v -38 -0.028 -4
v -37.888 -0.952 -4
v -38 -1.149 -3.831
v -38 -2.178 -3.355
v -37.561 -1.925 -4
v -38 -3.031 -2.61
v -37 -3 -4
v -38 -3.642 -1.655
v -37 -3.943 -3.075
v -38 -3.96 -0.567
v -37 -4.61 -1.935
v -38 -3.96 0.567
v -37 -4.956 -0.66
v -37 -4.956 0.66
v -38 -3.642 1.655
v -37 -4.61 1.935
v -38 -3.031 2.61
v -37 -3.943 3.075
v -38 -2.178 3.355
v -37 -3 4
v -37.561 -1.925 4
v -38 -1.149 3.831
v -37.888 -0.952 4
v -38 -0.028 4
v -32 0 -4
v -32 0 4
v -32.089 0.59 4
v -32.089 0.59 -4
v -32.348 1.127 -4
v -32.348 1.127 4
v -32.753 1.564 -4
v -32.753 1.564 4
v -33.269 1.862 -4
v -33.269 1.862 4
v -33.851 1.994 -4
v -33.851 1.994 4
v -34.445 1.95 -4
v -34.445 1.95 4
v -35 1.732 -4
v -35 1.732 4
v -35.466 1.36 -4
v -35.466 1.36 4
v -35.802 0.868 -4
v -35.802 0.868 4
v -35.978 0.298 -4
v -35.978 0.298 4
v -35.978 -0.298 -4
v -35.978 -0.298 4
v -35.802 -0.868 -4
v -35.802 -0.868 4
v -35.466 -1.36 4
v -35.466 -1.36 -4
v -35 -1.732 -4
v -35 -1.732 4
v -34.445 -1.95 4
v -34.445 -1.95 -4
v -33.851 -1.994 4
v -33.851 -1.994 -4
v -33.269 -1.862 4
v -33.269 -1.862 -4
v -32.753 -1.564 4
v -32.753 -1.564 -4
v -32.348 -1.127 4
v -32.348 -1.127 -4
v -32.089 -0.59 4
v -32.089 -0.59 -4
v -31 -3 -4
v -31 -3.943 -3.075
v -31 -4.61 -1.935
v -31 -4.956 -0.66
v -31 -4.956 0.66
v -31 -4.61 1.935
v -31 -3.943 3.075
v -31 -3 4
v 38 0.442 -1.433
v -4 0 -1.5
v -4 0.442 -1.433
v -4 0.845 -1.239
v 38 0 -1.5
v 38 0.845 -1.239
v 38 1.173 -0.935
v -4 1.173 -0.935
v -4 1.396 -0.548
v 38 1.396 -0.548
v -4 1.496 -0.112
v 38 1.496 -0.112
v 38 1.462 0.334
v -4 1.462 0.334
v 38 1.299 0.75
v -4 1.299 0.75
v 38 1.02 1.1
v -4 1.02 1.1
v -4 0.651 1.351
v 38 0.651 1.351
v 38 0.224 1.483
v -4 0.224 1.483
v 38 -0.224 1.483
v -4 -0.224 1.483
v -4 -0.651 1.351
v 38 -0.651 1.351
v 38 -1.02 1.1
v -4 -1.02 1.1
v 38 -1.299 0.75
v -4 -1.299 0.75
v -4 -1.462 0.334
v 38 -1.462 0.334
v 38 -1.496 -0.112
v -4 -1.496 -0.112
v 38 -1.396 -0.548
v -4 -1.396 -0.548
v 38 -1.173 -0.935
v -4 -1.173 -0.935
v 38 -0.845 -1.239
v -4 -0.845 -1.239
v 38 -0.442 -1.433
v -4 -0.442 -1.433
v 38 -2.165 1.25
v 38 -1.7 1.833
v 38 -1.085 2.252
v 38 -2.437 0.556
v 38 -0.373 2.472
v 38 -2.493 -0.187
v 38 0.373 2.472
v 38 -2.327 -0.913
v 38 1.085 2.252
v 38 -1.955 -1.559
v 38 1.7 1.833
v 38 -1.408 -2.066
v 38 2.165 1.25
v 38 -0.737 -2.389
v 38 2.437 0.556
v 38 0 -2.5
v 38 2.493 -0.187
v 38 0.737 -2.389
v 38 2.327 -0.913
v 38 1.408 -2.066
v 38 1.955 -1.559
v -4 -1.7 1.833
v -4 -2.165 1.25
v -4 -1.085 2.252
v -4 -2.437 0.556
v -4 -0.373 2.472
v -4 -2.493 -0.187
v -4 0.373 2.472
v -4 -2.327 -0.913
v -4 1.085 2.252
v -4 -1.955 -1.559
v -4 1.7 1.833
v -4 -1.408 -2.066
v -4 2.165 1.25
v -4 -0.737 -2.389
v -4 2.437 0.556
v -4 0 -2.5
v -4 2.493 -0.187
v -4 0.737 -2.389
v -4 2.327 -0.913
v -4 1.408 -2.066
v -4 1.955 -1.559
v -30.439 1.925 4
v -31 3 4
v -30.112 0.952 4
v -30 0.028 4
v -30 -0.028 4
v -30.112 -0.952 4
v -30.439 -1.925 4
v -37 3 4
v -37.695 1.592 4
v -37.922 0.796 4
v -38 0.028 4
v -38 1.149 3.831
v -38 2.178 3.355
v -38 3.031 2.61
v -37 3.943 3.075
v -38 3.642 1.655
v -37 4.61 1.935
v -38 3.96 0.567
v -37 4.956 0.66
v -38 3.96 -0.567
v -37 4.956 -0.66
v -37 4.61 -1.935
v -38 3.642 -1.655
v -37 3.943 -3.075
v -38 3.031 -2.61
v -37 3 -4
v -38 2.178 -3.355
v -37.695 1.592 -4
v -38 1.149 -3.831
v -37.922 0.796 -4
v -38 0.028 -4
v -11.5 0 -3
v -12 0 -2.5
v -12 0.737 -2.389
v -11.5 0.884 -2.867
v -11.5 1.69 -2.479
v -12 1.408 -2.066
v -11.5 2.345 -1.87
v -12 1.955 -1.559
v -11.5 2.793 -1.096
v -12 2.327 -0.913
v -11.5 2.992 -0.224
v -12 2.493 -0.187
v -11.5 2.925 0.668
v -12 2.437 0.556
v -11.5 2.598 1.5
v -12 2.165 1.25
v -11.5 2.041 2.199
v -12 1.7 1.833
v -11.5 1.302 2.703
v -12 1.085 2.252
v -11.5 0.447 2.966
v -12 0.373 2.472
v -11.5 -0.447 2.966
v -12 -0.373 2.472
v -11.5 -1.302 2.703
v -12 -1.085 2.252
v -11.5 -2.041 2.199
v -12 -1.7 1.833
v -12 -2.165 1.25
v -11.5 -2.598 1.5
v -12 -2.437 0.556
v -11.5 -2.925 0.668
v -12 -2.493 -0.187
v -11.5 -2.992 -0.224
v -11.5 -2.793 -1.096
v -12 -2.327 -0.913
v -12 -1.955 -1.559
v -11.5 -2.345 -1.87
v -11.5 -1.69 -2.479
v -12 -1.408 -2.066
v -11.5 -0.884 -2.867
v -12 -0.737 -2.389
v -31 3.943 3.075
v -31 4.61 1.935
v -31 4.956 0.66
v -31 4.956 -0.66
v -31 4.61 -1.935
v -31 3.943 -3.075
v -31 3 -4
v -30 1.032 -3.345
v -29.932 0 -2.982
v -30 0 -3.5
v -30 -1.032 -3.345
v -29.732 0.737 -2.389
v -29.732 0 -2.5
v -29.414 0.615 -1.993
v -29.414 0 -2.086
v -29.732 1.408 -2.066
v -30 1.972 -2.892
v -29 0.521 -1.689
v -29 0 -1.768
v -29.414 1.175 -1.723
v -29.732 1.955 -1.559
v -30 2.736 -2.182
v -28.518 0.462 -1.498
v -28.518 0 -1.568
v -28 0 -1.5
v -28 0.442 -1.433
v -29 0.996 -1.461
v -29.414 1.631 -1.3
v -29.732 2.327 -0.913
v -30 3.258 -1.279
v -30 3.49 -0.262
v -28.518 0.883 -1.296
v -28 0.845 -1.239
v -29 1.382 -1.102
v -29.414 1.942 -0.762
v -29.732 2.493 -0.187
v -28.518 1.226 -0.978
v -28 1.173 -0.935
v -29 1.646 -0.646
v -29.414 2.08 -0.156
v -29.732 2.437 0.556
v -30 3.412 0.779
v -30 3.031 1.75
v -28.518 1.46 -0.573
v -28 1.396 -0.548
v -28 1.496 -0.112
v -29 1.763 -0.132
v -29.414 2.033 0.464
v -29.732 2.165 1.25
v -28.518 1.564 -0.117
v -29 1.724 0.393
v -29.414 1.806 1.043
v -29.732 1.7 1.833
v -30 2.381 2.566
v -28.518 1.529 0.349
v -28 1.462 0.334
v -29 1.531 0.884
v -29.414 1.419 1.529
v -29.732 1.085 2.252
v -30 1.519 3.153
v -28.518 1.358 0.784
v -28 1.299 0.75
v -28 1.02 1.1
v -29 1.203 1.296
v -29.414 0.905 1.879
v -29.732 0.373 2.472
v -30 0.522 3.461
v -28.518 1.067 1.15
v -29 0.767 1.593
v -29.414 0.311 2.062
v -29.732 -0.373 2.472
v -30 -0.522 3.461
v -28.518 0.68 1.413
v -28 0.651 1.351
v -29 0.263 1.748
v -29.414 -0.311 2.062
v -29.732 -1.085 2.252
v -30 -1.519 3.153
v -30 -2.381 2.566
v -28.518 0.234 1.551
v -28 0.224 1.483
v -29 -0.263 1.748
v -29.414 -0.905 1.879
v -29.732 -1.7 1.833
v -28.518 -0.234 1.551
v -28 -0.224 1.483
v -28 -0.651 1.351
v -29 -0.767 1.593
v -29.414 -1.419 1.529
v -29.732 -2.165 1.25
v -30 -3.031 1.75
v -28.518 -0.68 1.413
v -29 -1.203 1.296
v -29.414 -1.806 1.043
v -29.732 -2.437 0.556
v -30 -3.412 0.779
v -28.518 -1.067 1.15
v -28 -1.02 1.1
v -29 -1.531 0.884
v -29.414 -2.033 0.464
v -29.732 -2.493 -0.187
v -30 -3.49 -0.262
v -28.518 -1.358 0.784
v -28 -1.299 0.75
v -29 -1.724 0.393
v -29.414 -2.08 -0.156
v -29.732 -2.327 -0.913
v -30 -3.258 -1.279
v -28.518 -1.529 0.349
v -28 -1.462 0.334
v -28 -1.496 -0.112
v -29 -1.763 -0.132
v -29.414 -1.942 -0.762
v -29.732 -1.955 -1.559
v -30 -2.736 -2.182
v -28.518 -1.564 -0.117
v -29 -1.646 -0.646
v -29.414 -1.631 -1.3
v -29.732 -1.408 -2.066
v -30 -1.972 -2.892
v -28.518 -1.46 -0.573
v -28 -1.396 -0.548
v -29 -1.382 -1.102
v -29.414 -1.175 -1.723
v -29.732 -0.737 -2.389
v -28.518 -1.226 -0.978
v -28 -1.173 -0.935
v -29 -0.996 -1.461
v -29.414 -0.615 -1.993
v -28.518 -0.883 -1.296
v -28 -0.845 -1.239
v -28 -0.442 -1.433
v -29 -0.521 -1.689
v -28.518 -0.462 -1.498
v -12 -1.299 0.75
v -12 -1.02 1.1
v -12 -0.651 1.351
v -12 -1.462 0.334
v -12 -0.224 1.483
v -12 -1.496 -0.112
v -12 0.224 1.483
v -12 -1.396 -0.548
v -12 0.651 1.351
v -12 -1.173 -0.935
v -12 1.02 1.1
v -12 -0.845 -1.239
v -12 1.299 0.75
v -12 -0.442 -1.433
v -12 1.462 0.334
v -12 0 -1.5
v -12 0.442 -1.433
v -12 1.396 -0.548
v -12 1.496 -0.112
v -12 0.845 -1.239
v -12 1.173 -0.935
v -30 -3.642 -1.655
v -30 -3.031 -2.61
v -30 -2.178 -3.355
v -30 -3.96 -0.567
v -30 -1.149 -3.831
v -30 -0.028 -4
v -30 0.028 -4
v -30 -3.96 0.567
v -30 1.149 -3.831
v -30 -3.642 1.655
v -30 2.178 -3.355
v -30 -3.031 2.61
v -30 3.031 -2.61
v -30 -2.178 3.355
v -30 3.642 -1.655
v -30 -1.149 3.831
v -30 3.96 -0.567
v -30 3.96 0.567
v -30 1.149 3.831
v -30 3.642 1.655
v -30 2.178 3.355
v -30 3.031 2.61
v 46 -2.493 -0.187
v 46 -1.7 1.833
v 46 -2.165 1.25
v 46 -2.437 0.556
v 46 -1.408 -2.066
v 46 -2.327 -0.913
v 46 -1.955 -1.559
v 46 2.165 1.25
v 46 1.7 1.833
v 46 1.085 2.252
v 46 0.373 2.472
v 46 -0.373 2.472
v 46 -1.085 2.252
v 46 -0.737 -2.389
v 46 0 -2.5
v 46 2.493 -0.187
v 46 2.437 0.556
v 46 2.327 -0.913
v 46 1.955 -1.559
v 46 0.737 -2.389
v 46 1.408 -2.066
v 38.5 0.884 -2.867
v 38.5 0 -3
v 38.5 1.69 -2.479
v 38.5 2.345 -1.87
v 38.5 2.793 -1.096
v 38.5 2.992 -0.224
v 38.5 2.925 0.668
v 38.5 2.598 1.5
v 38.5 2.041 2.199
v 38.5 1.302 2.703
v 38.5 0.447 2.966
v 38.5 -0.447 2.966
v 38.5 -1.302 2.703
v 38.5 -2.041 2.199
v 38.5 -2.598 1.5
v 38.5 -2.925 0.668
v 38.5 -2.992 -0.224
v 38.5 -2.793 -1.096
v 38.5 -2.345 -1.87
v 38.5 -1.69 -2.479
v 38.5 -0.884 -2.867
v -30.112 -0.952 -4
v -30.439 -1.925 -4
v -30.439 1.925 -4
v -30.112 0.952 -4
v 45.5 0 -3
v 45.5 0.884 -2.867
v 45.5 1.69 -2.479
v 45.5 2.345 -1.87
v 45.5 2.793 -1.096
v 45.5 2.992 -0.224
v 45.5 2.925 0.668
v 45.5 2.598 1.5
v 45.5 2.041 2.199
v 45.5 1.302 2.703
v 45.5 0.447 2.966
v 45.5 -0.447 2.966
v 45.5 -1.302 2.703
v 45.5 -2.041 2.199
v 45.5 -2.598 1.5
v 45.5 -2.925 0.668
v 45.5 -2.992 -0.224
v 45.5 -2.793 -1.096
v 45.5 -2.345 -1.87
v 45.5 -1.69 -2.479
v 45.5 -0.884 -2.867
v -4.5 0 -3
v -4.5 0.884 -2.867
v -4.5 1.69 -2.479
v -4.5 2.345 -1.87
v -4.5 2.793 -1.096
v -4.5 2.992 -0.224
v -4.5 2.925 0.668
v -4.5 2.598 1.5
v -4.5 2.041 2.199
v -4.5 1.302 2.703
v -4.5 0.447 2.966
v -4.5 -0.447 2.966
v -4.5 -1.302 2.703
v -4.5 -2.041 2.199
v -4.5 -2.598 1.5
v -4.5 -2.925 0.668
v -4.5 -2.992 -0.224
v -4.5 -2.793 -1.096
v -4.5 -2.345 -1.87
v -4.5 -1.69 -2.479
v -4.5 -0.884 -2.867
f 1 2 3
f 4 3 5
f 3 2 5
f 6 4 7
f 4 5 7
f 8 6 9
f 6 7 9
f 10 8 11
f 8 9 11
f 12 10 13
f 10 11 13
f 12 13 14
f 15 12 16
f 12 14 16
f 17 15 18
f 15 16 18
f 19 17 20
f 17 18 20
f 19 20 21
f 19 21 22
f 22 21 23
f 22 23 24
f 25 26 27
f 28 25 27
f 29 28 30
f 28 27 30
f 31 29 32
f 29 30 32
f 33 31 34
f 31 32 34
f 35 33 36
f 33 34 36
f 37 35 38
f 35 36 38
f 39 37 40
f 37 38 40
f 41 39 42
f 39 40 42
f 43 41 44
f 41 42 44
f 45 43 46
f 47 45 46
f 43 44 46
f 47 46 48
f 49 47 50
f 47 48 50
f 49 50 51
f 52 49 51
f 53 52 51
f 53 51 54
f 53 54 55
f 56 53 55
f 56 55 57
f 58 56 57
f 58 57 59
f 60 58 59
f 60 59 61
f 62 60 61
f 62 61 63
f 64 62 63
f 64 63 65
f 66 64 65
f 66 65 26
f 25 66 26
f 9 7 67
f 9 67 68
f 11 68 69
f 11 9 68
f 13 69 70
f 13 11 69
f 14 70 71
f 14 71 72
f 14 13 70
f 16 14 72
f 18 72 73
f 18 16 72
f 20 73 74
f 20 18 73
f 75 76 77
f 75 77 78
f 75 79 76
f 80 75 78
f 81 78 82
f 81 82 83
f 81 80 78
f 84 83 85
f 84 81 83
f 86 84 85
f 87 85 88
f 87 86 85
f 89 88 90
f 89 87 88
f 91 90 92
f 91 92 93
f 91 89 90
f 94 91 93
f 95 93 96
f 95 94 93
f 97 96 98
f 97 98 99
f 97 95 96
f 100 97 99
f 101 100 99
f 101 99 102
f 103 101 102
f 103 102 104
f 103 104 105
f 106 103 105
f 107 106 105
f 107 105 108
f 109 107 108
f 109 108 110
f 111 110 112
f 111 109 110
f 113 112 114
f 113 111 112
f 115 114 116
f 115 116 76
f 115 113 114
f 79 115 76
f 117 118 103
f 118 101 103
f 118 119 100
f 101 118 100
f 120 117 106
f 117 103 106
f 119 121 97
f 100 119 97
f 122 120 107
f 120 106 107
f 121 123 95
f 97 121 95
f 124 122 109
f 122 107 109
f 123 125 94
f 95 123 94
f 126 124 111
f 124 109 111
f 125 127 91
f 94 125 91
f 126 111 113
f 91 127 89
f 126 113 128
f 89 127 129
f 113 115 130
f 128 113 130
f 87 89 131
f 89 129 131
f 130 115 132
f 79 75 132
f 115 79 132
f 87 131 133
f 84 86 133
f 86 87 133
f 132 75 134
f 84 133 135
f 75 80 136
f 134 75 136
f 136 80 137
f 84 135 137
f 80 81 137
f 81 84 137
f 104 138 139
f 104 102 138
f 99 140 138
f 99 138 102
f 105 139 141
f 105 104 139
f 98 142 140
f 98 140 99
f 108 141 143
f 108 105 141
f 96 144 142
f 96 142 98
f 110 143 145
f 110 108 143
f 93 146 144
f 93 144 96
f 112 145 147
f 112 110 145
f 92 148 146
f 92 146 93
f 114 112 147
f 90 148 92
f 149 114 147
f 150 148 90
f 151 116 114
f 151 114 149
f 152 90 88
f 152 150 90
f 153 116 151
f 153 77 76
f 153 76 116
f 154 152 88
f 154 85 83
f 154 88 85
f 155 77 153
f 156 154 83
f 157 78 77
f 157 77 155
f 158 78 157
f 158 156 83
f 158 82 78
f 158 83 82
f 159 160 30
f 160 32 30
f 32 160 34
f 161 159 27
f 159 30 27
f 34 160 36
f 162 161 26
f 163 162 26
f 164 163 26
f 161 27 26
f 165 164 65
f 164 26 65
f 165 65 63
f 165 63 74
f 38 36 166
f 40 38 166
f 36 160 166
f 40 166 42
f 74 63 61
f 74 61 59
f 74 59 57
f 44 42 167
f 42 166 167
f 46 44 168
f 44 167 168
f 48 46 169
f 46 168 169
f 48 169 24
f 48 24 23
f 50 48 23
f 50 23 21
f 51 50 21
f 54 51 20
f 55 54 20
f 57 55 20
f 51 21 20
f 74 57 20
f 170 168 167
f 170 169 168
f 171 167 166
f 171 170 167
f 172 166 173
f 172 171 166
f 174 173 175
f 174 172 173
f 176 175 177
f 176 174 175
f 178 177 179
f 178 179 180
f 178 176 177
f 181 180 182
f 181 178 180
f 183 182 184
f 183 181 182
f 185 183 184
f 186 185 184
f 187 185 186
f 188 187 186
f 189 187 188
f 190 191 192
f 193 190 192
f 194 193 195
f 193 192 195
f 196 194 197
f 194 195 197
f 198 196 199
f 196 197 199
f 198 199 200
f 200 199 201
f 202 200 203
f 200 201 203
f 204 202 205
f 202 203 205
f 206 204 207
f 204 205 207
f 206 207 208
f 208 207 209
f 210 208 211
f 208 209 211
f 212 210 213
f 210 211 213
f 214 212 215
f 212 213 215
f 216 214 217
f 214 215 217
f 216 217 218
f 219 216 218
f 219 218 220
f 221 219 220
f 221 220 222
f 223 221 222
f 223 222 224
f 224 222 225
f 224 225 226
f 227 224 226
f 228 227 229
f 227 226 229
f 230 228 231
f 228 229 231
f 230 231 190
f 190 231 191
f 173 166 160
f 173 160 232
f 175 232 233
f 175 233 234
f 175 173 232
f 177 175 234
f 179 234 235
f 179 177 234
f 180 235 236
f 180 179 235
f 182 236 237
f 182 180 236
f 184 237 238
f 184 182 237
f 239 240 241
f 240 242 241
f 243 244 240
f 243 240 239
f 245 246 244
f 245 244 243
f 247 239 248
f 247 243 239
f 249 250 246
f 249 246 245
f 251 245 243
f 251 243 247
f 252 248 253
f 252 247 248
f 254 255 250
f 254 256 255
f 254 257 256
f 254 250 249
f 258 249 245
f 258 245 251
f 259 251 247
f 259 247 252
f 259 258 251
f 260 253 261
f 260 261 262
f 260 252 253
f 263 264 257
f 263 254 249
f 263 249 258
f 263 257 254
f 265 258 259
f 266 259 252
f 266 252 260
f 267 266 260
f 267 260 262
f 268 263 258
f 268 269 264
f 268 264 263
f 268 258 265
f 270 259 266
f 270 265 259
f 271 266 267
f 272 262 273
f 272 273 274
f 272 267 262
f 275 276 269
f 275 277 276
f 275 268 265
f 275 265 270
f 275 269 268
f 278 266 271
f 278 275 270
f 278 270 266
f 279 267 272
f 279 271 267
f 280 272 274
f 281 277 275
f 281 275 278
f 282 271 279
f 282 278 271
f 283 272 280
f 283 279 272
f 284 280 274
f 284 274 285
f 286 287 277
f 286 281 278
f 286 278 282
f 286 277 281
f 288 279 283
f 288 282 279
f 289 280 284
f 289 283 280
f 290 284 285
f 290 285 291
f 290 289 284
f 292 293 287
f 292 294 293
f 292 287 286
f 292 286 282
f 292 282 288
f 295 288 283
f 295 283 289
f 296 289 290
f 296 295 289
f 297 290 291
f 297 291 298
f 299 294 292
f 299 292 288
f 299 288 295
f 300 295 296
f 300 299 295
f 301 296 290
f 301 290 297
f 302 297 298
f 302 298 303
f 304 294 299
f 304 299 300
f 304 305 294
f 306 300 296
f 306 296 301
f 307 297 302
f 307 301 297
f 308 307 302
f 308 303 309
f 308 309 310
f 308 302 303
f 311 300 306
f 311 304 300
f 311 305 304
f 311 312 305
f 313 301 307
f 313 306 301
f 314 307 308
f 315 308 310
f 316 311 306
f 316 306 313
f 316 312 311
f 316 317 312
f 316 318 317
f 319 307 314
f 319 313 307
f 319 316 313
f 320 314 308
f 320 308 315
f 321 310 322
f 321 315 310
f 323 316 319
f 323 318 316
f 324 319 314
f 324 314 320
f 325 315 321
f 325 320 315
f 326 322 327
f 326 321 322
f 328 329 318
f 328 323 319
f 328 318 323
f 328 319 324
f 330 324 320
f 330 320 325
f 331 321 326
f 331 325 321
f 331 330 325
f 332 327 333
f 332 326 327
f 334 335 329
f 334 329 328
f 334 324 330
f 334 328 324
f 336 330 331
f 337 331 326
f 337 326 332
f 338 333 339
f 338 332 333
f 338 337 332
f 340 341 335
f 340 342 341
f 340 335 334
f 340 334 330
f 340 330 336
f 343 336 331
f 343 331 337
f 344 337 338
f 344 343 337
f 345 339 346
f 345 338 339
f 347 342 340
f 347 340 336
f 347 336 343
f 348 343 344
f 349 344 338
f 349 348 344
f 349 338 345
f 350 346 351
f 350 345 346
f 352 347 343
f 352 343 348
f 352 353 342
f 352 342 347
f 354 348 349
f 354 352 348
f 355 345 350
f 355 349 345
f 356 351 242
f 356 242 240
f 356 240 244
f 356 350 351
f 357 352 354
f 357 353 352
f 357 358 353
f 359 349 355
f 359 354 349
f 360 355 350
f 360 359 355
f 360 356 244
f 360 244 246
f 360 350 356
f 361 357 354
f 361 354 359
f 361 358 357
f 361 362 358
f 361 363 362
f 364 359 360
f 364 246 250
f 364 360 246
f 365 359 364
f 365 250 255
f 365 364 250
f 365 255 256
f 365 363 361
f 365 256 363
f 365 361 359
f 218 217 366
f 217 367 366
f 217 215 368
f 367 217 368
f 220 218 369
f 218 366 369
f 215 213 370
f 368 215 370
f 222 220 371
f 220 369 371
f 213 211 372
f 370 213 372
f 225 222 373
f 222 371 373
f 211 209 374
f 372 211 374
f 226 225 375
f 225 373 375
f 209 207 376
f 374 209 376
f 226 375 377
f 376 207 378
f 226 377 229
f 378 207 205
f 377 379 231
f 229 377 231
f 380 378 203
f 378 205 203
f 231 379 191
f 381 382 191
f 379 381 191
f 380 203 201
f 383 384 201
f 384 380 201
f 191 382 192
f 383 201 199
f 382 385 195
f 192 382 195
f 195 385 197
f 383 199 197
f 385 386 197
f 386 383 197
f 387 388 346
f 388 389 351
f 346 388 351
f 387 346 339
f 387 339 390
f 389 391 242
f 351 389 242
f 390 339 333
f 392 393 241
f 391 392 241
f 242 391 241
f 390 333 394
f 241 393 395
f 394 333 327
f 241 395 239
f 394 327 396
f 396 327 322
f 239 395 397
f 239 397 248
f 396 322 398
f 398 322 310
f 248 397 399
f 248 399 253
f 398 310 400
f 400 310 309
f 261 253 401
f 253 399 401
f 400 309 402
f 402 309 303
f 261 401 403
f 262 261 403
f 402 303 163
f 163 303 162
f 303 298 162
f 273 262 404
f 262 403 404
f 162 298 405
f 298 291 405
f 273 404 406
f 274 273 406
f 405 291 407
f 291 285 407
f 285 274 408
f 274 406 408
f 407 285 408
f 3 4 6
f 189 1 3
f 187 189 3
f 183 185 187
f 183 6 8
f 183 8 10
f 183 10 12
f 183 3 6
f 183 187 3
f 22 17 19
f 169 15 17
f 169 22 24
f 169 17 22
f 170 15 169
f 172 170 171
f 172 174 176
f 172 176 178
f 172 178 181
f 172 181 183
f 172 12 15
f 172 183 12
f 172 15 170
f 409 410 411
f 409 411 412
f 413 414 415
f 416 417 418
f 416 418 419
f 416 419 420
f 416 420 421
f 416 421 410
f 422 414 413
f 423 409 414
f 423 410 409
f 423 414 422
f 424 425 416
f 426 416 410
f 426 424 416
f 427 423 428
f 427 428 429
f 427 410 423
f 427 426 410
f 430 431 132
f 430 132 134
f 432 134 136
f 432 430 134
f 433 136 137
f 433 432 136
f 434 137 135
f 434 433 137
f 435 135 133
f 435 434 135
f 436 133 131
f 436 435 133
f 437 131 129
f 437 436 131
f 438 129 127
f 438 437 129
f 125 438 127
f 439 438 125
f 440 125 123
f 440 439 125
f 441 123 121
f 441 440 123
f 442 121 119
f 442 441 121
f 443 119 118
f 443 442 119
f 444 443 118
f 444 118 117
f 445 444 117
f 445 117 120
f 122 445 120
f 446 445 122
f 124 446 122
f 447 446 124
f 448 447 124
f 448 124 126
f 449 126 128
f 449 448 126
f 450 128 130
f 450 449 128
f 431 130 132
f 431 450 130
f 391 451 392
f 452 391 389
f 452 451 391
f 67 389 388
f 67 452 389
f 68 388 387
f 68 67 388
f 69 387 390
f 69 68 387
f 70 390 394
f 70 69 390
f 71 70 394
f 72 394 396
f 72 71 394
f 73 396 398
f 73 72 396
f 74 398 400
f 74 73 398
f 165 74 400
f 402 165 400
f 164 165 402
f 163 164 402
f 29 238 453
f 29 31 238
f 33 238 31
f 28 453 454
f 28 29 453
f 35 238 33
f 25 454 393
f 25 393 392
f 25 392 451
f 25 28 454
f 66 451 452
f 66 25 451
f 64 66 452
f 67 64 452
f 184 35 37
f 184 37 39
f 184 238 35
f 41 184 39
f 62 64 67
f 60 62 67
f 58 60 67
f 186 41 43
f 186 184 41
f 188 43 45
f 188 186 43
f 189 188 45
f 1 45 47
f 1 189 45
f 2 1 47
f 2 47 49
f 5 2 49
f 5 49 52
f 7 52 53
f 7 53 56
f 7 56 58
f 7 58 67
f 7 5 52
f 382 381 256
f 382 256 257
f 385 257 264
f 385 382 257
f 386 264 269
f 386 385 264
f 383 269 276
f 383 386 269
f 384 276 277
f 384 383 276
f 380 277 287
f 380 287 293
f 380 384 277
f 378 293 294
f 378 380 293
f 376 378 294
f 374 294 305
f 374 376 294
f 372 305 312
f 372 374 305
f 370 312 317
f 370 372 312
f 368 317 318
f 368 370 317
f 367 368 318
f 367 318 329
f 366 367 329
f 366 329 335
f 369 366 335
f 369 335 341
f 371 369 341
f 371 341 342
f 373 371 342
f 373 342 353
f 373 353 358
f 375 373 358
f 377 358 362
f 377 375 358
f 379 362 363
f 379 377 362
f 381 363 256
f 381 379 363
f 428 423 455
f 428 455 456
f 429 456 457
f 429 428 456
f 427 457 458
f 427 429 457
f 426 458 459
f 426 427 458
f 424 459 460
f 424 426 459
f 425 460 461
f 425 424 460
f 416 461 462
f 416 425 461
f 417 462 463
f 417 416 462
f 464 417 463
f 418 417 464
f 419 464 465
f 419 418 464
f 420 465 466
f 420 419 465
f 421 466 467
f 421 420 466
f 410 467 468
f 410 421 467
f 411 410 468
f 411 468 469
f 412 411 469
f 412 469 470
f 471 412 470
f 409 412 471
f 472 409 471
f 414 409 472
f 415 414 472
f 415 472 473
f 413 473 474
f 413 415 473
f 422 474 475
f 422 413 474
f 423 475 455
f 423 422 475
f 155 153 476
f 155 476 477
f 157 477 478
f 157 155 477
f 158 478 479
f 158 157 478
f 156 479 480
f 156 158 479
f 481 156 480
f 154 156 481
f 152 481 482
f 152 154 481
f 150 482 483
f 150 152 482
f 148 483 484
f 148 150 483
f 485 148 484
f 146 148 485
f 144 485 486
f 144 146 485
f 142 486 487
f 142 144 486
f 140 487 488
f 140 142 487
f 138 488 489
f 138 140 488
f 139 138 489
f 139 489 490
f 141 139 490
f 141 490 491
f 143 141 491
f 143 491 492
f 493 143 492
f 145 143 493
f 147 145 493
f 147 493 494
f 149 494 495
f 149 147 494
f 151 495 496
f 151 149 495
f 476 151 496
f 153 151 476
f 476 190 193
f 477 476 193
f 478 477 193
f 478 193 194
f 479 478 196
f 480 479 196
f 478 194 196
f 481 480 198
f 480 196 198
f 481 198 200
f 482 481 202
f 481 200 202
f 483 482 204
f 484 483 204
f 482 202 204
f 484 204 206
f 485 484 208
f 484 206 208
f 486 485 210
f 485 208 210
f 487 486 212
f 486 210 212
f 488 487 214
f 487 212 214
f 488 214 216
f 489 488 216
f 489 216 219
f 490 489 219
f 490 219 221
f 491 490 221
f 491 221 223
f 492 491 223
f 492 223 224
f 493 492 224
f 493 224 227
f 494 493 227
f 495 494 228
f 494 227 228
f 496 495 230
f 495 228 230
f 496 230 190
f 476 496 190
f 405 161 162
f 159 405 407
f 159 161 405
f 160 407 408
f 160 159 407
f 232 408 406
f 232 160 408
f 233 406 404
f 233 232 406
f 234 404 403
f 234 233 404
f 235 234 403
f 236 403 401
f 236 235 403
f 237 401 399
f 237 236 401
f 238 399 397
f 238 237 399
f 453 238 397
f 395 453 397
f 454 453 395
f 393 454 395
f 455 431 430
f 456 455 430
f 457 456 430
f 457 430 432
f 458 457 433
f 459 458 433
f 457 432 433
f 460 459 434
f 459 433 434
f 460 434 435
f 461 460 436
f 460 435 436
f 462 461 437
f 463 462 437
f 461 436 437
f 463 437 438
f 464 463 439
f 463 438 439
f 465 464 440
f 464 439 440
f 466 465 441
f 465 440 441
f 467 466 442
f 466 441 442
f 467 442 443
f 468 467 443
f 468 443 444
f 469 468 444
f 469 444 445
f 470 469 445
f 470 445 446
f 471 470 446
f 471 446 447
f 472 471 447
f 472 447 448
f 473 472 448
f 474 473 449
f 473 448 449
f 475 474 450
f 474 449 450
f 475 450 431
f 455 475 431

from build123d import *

# Parameters (mm, degrees)
SKETCH1_R           = 1.5
BOSS_EXTRUDE1_DEPTH = 38
SKETCH2_R           = 3
BOSS_EXTRUDE2_DEPTH = 8
BOSS_EXTRUDE3_START = -50
SKETCH2_2_R         = 3
BOSS_EXTRUDE3_DEPTH = 8
CHAMFER1_SIZE       = 0.5
SKETCH3_R           = 5
BOSS_EXTRUDE4_DEPTH = 8
CUT_EXTRUDE1_DEPTH  = 8
SKETCH5_R           = 2
CUT_EXTRUDE2_DEPTH  = 47.957427527
CHAMFER3_SIZE       = 1
FILLET1_R           = 2
CHAMFER4_SIZE       = 1


with BuildPart() as part:
    # Sketch1 → Boss-Extrude1 (new, symmetric)
    with BuildSketch(Plane(origin=(0, 0, 0), x_dir=(0, 0, -1), z_dir=(1, 0, 0))):
        Circle(SKETCH1_R)
    extrude(amount=BOSS_EXTRUDE1_DEPTH, both=True)

    # Sketch2 → Boss-Extrude2 (add)
    with BuildSketch(Plane(origin=(38, 0, 0), x_dir=(0, 0, -1), z_dir=(1, 0, 0))):
        Circle(SKETCH2_R)
    extrude(amount=BOSS_EXTRUDE2_DEPTH)

    # Sketch2<2> → Boss-Extrude3 (add)
    with BuildSketch(Plane(origin=(38, 0, 0), x_dir=(0, 0, -1), z_dir=(1, 0, 0)).offset(BOSS_EXTRUDE3_START)):
        Circle(SKETCH2_2_R)
    extrude(amount=BOSS_EXTRUDE3_DEPTH)

    # Chamfer1
    chamfer1_edges = [part.edges().sort_by_distance(p)[0] for p in [
        (-12, 0, 3),
        (-4, 0, 3),
        (38, 0, 3),
        (46, 0, 3),
    ]]
    chamfer(chamfer1_edges, length=CHAMFER1_SIZE)

    # Sketch3 → Boss-Extrude4 (add)
    with BuildSketch(Plane.ZY.offset(38)):
        Circle(SKETCH3_R)
    extrude(amount=-BOSS_EXTRUDE4_DEPTH)

    # Sketch4 → Cut-Extrude1 (cut)
    with BuildSketch(Plane.ZY.offset(38)):
        with BuildLine():
            Line((-4, 3), (-4, -3))
            ThreePointArc((-4, -3), (-5, 0), (-4, 3))
        make_face()
        with BuildLine():
            Line((4, 3), (4, -3))
            ThreePointArc((4, -3), (5, 0), (4, 3))
        make_face()
    extrude(amount=-CUT_EXTRUDE1_DEPTH, mode=Mode.SUBTRACT)

    # Sketch5 → Cut-Extrude2 (cut, through all)
    with BuildSketch(Plane.XY.offset(4)):
        with Locations((-34, 0)):
            Circle(SKETCH5_R)
    extrude(amount=-CUT_EXTRUDE2_DEPTH, mode=Mode.SUBTRACT)

    # Chamfer3
    chamfer3_edges = [part.edges().sort_by_distance(p)[0] for p in [
        (-38, 5, 0),
        (-38, -5, 0),
    ]]
    chamfer(chamfer3_edges, length=CHAMFER3_SIZE - 0.0001)  # a hair under: the kernel refuses the full size

    # Fillet1
    fillet1_edges = [part.edges().sort_by_distance(p)[0] for p in [
        (-30, 0, 1.5),
    ]]
    fillet(fillet1_edges, radius=FILLET1_R)

    # Chamfer4
    chamfer4_edges = [part.edges().sort_by_distance(p)[0] for p in [
        (-30, 5, 0),
        (-30, -5, 0),
    ]]
    chamfer(chamfer4_edges, length=CHAMFER4_SIZE - 0.0001)  # a hair under: the kernel refuses the full size


solid = part.part
